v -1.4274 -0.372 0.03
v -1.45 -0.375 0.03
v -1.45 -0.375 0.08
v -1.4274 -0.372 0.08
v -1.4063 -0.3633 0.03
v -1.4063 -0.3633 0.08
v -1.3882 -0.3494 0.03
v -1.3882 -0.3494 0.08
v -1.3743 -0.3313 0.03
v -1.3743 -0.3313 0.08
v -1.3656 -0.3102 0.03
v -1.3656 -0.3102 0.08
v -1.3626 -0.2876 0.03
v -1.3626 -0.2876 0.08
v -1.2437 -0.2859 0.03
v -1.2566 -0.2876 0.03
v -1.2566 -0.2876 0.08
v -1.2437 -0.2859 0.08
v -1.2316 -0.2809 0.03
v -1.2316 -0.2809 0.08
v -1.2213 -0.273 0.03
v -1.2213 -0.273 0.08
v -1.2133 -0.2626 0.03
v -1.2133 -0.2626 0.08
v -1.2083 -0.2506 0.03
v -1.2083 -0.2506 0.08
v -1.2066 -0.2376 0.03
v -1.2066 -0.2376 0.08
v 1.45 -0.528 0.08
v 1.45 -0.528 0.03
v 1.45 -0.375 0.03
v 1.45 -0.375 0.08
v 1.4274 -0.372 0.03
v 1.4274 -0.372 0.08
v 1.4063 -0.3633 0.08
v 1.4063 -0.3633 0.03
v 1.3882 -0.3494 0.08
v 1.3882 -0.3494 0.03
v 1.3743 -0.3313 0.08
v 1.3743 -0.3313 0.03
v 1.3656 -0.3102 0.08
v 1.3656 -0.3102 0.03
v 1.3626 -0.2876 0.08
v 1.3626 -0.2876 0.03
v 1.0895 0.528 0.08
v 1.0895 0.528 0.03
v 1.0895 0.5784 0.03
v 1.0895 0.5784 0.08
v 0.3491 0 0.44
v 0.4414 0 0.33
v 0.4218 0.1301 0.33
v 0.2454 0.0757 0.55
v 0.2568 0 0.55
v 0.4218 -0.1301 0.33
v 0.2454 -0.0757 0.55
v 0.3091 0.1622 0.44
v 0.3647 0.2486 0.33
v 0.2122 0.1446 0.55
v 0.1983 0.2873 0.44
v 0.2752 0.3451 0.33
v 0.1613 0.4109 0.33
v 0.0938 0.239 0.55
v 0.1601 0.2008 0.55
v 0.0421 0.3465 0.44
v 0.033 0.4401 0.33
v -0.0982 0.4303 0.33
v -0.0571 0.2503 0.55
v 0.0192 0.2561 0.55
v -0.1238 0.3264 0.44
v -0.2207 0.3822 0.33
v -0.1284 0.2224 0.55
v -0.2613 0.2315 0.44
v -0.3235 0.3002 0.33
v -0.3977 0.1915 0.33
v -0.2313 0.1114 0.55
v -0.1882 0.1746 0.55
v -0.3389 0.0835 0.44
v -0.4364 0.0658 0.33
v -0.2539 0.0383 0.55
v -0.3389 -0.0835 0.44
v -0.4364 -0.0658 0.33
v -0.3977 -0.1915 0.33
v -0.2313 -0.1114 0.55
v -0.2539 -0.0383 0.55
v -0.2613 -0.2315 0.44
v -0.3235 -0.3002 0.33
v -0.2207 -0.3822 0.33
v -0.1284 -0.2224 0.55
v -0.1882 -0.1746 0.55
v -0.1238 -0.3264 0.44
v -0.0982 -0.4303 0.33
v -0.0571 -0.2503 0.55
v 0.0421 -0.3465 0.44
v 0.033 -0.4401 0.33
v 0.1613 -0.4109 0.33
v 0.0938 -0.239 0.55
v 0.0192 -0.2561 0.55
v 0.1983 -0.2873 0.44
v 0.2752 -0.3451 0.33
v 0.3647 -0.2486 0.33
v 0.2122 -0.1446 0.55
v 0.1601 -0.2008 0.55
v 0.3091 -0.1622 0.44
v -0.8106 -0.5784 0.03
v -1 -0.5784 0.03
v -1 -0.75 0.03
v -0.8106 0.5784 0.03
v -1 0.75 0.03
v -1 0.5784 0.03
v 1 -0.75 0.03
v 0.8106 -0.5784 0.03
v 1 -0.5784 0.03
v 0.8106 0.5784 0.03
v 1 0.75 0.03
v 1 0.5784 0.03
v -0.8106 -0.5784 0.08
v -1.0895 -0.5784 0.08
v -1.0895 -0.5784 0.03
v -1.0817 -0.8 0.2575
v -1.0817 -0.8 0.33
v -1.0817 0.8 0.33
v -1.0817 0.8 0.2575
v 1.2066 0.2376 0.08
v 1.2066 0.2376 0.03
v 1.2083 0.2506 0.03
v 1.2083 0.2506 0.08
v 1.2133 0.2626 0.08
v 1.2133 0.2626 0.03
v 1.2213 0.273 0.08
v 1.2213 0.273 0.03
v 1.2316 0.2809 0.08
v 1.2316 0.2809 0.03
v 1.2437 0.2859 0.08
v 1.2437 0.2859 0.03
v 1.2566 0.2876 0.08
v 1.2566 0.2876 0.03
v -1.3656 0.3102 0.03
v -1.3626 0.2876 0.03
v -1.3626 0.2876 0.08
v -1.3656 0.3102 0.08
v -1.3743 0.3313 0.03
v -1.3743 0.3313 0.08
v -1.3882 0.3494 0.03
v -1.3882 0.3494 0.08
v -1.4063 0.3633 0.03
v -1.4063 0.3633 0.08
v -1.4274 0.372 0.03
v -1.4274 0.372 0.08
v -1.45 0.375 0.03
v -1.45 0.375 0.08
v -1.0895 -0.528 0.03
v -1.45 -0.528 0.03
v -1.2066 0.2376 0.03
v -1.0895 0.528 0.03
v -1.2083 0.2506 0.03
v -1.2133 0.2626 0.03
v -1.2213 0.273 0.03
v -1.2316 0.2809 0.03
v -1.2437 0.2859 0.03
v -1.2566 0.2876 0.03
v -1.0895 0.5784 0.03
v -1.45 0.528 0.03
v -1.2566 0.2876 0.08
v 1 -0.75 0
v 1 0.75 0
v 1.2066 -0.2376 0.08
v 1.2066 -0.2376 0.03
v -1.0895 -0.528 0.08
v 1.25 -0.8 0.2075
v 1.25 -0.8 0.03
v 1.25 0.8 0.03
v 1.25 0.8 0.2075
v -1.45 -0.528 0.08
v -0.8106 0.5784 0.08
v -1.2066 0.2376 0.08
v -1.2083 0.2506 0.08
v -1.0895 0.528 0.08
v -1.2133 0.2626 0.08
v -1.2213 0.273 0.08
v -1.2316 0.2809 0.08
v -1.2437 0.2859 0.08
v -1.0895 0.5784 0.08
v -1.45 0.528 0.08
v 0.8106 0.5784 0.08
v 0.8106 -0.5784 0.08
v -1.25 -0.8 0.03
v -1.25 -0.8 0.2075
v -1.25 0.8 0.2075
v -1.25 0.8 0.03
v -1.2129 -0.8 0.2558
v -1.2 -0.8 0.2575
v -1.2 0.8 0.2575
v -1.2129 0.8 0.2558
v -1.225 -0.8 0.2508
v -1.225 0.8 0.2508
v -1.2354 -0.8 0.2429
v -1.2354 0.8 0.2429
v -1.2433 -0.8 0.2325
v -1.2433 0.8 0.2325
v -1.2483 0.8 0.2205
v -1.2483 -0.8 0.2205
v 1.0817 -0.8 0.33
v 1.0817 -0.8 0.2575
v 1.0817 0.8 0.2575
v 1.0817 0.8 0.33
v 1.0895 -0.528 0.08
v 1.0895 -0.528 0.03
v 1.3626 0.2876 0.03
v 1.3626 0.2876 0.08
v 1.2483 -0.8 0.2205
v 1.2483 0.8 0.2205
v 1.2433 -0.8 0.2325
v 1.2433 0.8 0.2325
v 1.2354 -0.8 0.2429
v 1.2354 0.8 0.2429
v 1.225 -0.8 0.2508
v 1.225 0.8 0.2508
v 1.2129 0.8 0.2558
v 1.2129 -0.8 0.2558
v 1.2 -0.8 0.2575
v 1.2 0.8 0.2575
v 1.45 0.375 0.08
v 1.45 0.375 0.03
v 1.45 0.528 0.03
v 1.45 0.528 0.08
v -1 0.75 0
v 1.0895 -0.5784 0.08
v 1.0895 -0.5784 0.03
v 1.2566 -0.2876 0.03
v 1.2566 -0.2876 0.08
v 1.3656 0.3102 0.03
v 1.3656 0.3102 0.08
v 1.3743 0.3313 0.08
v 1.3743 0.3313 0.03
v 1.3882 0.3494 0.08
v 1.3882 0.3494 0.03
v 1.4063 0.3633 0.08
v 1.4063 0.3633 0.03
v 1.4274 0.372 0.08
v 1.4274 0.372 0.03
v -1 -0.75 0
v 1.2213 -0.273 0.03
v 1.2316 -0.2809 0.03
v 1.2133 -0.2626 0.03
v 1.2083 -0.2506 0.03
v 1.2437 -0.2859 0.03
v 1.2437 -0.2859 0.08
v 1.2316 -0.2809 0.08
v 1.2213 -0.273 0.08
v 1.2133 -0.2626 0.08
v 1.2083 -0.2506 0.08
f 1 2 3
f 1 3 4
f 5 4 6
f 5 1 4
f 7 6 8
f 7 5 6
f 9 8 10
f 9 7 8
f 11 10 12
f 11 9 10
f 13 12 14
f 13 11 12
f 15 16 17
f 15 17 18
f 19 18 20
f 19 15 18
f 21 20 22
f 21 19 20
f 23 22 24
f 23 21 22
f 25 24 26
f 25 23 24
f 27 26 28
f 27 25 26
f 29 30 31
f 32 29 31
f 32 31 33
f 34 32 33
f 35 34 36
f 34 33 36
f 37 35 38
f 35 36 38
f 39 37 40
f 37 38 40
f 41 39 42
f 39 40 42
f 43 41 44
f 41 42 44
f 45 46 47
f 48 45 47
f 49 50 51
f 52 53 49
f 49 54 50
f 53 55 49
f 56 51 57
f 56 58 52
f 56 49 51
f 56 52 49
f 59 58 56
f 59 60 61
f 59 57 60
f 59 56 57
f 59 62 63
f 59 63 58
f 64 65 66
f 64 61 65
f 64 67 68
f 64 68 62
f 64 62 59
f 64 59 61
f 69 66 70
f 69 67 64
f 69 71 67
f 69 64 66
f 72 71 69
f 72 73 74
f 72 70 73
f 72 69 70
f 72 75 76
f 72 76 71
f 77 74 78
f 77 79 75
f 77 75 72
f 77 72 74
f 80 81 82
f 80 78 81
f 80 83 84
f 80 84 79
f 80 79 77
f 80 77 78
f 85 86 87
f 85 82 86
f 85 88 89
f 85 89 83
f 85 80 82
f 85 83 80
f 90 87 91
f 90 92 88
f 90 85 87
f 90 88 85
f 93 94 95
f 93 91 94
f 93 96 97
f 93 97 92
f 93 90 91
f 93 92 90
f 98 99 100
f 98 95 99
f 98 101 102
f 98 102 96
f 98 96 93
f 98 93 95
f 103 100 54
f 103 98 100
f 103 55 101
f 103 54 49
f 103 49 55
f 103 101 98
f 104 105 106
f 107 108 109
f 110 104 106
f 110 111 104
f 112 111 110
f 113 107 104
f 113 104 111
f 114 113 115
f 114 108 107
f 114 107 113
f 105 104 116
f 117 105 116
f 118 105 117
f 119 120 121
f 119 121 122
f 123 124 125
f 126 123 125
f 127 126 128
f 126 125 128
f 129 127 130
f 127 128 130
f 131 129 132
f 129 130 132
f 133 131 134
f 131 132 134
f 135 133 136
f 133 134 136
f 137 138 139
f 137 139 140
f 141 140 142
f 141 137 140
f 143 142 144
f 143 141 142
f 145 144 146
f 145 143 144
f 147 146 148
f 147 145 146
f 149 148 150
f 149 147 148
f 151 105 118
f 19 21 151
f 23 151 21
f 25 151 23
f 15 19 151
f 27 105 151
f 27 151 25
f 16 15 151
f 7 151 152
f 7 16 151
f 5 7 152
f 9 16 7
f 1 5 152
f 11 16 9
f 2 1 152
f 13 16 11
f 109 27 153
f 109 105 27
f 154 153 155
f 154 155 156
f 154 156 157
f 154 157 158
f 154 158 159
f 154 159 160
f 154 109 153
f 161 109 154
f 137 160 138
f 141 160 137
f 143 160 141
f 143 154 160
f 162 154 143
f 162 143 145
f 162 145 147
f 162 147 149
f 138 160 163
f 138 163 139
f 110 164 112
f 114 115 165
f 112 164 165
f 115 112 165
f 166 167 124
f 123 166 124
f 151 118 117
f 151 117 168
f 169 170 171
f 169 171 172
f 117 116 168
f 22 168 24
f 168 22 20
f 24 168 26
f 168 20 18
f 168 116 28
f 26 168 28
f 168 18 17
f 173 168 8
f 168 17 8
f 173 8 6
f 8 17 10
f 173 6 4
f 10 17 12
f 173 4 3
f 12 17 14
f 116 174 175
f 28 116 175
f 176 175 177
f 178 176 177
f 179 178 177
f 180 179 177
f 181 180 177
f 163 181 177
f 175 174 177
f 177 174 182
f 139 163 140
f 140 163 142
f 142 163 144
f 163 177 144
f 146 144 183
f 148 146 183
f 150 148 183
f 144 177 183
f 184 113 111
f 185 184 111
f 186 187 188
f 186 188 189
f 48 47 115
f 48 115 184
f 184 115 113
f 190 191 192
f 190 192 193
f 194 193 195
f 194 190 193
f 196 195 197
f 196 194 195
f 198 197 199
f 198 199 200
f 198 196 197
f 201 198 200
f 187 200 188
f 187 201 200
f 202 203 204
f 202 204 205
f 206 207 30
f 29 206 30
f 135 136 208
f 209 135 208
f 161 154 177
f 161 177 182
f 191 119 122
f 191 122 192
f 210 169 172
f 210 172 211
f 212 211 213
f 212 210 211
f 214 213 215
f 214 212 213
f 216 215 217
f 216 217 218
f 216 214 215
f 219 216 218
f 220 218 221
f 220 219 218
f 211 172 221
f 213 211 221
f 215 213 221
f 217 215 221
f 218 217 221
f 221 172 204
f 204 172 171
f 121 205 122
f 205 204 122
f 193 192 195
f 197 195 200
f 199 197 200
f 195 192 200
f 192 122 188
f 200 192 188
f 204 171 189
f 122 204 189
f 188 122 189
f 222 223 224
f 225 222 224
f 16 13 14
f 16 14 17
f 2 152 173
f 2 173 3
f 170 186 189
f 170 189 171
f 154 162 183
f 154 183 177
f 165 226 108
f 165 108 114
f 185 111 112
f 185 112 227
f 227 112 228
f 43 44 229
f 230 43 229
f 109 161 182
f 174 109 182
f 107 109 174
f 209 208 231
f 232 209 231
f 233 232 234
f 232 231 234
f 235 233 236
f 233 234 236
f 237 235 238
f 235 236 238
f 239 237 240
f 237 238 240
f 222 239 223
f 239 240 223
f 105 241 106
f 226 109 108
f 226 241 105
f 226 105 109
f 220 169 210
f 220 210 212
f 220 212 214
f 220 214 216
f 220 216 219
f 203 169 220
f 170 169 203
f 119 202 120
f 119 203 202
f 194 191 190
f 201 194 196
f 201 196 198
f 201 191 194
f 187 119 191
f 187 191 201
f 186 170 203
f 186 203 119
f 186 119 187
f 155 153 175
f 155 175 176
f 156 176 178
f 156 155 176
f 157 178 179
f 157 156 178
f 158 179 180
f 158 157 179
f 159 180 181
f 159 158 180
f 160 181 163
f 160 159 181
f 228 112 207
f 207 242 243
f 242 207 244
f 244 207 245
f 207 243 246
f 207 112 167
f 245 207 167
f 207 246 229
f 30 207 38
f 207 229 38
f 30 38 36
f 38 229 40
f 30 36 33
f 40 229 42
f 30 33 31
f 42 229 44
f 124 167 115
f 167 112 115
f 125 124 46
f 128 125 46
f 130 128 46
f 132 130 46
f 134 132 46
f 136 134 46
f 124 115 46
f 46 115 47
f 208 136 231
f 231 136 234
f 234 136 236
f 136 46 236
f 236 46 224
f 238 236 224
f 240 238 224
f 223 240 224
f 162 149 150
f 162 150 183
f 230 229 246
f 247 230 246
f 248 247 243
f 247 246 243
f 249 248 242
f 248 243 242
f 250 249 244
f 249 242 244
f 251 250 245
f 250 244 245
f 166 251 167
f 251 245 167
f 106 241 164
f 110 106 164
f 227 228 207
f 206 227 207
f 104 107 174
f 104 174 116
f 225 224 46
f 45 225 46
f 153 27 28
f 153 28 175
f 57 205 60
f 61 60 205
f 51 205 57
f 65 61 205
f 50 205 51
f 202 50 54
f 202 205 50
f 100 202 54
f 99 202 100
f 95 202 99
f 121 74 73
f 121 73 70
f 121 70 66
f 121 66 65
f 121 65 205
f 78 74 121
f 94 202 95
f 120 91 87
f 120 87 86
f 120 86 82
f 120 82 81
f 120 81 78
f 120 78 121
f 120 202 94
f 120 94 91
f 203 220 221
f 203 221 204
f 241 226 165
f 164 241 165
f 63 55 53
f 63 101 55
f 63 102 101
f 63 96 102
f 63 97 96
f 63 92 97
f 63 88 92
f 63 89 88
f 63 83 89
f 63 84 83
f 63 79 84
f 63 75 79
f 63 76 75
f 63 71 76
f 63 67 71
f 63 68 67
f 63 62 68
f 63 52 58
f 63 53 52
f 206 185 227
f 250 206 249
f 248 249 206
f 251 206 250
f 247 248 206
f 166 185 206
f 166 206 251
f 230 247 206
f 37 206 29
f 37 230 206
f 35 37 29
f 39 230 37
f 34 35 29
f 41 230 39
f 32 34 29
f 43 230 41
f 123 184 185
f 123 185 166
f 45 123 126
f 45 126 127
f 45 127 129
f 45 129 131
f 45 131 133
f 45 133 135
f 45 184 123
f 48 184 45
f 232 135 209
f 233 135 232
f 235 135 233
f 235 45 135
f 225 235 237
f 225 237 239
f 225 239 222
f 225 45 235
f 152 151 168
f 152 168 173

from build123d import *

# Parameters (mm, degrees)
SKETCH1_W                = 2
SKETCH1_H                = 1.5
BOSS_EXTRUDE1_DEPTH      = 0.03
BOSS_EXTRUDE2_DEPTH      = 0.05
BOSS_EXTRUDE3_DEPTH      = 0.8
BOSS_EXTRUDE3_DEPTH_BACK = 0.8
SKETCH4_R                = 0.441371156
BOSS_EXTRUDE5_DEPTH      = 0.22
BOSS_EXTRUDE5_TAPER      = 40


with BuildPart() as part:
    # Sketch1 → Boss-Extrude1 (new body)
    with BuildSketch(Plane.XY):
        Rectangle(SKETCH1_W, SKETCH1_H)
    extrude(amount=BOSS_EXTRUDE1_DEPTH)

    # Sketch2 → Boss-Extrude2 (add)
    with BuildSketch(Plane.XY.offset(0.03)):
        with BuildLine():
            Line((-0.810643371, 0.578370815), (-0.810643371, -0.578370815))
            Line((-0.810643371, -0.578370815), (-1.089503482, -0.578370815))
            Line((-1.089503482, -0.578370815), (-1.089503482, -0.527978988))
            Line((-1.089503482, -0.527978988), (-1.45, -0.527978988))
            Line((-1.45, -0.527978988), (-1.45, -0.375))
            ThreePointArc((-1.45, -0.375), (-1.388226406, -0.349412539), (-1.362638945, -0.287638945))
            Line((-1.362638945, -0.287638945), (-1.256631634, -0.287638945))
            ThreePointArc((-1.256631634, -0.287638945), (-1.221276295, -0.272994284), (-1.206631634, -0.237638945))
            Line((-1.206631634, -0.237638945), (-1.206631634, 0.237638945))
            ThreePointArc((-1.206631634, 0.237638945), (-1.221276295, 0.272994284), (-1.256631634, 0.287638945))
            Line((-1.256631634, 0.287638945), (-1.362638945, 0.287638945))
            ThreePointArc((-1.362638945, 0.287638945), (-1.388226406, 0.349412539), (-1.45, 0.375))
            Line((-1.45, 0.375), (-1.45, 0.527978988))
            Line((-1.45, 0.527978988), (-1.089503482, 0.527978988))
            Line((-1.089503482, 0.527978988), (-1.089503482, 0.578370815))
            Line((-1.089503482, 0.578370815), (-0.810643371, 0.578370815))
        make_face()
    boss_extrude2 = extrude(amount=BOSS_EXTRUDE2_DEPTH)

    # Mirror1: Boss-Extrude2 across plane
    add(boss_extrude2.mirror(Plane(origin=(0, 0, 0), x_dir=(0, 0, 1), z_dir=(1, 0, 0))))


with BuildPart() as body_2:
    # Sketch3 → Boss-Extrude3 (new, two sides: drawn at the far end of the back side and taken through both)
    with BuildSketch(Plane(origin=(0, 0, 0), x_dir=(1, 0, 0), z_dir=(0, 1, 0)).offset(-BOSS_EXTRUDE3_DEPTH_BACK)):
        with BuildLine():
            Line((1.081724283, -0.33), (-1.081724283, -0.33))
            Line((-1.081724283, -0.33), (-1.081724283, -0.257546264))
            Line((-1.081724283, -0.257546264), (-1.2, -0.257546264))
            ThreePointArc((-1.2, -0.257546264), (-1.235355339, -0.242901603), (-1.25, -0.207546264))
            Line((-1.25, -0.207546264), (-1.25, -0.03))
            Line((-1.25, -0.03), (1.25, -0.03))
            Line((1.25, -0.03), (1.25, -0.207546264))
            ThreePointArc((1.25, -0.207546264), (1.235355339, -0.242901603), (1.2, -0.257546264))
            Line((1.2, -0.257546264), (1.081724283, -0.257546264))
            Line((1.081724283, -0.257546264), (1.081724283, -0.33))
        make_face()
    extrude(amount=BOSS_EXTRUDE3_DEPTH + BOSS_EXTRUDE3_DEPTH_BACK)

    # Sketch4 → Boss-Extrude5 (add)
    with BuildSketch(Plane.XY.offset(0.33)):
        Circle(SKETCH4_R)
    extrude(amount=BOSS_EXTRUDE5_DEPTH, taper=BOSS_EXTRUDE5_TAPER)


solid = Compound([part.part, body_2.part])
